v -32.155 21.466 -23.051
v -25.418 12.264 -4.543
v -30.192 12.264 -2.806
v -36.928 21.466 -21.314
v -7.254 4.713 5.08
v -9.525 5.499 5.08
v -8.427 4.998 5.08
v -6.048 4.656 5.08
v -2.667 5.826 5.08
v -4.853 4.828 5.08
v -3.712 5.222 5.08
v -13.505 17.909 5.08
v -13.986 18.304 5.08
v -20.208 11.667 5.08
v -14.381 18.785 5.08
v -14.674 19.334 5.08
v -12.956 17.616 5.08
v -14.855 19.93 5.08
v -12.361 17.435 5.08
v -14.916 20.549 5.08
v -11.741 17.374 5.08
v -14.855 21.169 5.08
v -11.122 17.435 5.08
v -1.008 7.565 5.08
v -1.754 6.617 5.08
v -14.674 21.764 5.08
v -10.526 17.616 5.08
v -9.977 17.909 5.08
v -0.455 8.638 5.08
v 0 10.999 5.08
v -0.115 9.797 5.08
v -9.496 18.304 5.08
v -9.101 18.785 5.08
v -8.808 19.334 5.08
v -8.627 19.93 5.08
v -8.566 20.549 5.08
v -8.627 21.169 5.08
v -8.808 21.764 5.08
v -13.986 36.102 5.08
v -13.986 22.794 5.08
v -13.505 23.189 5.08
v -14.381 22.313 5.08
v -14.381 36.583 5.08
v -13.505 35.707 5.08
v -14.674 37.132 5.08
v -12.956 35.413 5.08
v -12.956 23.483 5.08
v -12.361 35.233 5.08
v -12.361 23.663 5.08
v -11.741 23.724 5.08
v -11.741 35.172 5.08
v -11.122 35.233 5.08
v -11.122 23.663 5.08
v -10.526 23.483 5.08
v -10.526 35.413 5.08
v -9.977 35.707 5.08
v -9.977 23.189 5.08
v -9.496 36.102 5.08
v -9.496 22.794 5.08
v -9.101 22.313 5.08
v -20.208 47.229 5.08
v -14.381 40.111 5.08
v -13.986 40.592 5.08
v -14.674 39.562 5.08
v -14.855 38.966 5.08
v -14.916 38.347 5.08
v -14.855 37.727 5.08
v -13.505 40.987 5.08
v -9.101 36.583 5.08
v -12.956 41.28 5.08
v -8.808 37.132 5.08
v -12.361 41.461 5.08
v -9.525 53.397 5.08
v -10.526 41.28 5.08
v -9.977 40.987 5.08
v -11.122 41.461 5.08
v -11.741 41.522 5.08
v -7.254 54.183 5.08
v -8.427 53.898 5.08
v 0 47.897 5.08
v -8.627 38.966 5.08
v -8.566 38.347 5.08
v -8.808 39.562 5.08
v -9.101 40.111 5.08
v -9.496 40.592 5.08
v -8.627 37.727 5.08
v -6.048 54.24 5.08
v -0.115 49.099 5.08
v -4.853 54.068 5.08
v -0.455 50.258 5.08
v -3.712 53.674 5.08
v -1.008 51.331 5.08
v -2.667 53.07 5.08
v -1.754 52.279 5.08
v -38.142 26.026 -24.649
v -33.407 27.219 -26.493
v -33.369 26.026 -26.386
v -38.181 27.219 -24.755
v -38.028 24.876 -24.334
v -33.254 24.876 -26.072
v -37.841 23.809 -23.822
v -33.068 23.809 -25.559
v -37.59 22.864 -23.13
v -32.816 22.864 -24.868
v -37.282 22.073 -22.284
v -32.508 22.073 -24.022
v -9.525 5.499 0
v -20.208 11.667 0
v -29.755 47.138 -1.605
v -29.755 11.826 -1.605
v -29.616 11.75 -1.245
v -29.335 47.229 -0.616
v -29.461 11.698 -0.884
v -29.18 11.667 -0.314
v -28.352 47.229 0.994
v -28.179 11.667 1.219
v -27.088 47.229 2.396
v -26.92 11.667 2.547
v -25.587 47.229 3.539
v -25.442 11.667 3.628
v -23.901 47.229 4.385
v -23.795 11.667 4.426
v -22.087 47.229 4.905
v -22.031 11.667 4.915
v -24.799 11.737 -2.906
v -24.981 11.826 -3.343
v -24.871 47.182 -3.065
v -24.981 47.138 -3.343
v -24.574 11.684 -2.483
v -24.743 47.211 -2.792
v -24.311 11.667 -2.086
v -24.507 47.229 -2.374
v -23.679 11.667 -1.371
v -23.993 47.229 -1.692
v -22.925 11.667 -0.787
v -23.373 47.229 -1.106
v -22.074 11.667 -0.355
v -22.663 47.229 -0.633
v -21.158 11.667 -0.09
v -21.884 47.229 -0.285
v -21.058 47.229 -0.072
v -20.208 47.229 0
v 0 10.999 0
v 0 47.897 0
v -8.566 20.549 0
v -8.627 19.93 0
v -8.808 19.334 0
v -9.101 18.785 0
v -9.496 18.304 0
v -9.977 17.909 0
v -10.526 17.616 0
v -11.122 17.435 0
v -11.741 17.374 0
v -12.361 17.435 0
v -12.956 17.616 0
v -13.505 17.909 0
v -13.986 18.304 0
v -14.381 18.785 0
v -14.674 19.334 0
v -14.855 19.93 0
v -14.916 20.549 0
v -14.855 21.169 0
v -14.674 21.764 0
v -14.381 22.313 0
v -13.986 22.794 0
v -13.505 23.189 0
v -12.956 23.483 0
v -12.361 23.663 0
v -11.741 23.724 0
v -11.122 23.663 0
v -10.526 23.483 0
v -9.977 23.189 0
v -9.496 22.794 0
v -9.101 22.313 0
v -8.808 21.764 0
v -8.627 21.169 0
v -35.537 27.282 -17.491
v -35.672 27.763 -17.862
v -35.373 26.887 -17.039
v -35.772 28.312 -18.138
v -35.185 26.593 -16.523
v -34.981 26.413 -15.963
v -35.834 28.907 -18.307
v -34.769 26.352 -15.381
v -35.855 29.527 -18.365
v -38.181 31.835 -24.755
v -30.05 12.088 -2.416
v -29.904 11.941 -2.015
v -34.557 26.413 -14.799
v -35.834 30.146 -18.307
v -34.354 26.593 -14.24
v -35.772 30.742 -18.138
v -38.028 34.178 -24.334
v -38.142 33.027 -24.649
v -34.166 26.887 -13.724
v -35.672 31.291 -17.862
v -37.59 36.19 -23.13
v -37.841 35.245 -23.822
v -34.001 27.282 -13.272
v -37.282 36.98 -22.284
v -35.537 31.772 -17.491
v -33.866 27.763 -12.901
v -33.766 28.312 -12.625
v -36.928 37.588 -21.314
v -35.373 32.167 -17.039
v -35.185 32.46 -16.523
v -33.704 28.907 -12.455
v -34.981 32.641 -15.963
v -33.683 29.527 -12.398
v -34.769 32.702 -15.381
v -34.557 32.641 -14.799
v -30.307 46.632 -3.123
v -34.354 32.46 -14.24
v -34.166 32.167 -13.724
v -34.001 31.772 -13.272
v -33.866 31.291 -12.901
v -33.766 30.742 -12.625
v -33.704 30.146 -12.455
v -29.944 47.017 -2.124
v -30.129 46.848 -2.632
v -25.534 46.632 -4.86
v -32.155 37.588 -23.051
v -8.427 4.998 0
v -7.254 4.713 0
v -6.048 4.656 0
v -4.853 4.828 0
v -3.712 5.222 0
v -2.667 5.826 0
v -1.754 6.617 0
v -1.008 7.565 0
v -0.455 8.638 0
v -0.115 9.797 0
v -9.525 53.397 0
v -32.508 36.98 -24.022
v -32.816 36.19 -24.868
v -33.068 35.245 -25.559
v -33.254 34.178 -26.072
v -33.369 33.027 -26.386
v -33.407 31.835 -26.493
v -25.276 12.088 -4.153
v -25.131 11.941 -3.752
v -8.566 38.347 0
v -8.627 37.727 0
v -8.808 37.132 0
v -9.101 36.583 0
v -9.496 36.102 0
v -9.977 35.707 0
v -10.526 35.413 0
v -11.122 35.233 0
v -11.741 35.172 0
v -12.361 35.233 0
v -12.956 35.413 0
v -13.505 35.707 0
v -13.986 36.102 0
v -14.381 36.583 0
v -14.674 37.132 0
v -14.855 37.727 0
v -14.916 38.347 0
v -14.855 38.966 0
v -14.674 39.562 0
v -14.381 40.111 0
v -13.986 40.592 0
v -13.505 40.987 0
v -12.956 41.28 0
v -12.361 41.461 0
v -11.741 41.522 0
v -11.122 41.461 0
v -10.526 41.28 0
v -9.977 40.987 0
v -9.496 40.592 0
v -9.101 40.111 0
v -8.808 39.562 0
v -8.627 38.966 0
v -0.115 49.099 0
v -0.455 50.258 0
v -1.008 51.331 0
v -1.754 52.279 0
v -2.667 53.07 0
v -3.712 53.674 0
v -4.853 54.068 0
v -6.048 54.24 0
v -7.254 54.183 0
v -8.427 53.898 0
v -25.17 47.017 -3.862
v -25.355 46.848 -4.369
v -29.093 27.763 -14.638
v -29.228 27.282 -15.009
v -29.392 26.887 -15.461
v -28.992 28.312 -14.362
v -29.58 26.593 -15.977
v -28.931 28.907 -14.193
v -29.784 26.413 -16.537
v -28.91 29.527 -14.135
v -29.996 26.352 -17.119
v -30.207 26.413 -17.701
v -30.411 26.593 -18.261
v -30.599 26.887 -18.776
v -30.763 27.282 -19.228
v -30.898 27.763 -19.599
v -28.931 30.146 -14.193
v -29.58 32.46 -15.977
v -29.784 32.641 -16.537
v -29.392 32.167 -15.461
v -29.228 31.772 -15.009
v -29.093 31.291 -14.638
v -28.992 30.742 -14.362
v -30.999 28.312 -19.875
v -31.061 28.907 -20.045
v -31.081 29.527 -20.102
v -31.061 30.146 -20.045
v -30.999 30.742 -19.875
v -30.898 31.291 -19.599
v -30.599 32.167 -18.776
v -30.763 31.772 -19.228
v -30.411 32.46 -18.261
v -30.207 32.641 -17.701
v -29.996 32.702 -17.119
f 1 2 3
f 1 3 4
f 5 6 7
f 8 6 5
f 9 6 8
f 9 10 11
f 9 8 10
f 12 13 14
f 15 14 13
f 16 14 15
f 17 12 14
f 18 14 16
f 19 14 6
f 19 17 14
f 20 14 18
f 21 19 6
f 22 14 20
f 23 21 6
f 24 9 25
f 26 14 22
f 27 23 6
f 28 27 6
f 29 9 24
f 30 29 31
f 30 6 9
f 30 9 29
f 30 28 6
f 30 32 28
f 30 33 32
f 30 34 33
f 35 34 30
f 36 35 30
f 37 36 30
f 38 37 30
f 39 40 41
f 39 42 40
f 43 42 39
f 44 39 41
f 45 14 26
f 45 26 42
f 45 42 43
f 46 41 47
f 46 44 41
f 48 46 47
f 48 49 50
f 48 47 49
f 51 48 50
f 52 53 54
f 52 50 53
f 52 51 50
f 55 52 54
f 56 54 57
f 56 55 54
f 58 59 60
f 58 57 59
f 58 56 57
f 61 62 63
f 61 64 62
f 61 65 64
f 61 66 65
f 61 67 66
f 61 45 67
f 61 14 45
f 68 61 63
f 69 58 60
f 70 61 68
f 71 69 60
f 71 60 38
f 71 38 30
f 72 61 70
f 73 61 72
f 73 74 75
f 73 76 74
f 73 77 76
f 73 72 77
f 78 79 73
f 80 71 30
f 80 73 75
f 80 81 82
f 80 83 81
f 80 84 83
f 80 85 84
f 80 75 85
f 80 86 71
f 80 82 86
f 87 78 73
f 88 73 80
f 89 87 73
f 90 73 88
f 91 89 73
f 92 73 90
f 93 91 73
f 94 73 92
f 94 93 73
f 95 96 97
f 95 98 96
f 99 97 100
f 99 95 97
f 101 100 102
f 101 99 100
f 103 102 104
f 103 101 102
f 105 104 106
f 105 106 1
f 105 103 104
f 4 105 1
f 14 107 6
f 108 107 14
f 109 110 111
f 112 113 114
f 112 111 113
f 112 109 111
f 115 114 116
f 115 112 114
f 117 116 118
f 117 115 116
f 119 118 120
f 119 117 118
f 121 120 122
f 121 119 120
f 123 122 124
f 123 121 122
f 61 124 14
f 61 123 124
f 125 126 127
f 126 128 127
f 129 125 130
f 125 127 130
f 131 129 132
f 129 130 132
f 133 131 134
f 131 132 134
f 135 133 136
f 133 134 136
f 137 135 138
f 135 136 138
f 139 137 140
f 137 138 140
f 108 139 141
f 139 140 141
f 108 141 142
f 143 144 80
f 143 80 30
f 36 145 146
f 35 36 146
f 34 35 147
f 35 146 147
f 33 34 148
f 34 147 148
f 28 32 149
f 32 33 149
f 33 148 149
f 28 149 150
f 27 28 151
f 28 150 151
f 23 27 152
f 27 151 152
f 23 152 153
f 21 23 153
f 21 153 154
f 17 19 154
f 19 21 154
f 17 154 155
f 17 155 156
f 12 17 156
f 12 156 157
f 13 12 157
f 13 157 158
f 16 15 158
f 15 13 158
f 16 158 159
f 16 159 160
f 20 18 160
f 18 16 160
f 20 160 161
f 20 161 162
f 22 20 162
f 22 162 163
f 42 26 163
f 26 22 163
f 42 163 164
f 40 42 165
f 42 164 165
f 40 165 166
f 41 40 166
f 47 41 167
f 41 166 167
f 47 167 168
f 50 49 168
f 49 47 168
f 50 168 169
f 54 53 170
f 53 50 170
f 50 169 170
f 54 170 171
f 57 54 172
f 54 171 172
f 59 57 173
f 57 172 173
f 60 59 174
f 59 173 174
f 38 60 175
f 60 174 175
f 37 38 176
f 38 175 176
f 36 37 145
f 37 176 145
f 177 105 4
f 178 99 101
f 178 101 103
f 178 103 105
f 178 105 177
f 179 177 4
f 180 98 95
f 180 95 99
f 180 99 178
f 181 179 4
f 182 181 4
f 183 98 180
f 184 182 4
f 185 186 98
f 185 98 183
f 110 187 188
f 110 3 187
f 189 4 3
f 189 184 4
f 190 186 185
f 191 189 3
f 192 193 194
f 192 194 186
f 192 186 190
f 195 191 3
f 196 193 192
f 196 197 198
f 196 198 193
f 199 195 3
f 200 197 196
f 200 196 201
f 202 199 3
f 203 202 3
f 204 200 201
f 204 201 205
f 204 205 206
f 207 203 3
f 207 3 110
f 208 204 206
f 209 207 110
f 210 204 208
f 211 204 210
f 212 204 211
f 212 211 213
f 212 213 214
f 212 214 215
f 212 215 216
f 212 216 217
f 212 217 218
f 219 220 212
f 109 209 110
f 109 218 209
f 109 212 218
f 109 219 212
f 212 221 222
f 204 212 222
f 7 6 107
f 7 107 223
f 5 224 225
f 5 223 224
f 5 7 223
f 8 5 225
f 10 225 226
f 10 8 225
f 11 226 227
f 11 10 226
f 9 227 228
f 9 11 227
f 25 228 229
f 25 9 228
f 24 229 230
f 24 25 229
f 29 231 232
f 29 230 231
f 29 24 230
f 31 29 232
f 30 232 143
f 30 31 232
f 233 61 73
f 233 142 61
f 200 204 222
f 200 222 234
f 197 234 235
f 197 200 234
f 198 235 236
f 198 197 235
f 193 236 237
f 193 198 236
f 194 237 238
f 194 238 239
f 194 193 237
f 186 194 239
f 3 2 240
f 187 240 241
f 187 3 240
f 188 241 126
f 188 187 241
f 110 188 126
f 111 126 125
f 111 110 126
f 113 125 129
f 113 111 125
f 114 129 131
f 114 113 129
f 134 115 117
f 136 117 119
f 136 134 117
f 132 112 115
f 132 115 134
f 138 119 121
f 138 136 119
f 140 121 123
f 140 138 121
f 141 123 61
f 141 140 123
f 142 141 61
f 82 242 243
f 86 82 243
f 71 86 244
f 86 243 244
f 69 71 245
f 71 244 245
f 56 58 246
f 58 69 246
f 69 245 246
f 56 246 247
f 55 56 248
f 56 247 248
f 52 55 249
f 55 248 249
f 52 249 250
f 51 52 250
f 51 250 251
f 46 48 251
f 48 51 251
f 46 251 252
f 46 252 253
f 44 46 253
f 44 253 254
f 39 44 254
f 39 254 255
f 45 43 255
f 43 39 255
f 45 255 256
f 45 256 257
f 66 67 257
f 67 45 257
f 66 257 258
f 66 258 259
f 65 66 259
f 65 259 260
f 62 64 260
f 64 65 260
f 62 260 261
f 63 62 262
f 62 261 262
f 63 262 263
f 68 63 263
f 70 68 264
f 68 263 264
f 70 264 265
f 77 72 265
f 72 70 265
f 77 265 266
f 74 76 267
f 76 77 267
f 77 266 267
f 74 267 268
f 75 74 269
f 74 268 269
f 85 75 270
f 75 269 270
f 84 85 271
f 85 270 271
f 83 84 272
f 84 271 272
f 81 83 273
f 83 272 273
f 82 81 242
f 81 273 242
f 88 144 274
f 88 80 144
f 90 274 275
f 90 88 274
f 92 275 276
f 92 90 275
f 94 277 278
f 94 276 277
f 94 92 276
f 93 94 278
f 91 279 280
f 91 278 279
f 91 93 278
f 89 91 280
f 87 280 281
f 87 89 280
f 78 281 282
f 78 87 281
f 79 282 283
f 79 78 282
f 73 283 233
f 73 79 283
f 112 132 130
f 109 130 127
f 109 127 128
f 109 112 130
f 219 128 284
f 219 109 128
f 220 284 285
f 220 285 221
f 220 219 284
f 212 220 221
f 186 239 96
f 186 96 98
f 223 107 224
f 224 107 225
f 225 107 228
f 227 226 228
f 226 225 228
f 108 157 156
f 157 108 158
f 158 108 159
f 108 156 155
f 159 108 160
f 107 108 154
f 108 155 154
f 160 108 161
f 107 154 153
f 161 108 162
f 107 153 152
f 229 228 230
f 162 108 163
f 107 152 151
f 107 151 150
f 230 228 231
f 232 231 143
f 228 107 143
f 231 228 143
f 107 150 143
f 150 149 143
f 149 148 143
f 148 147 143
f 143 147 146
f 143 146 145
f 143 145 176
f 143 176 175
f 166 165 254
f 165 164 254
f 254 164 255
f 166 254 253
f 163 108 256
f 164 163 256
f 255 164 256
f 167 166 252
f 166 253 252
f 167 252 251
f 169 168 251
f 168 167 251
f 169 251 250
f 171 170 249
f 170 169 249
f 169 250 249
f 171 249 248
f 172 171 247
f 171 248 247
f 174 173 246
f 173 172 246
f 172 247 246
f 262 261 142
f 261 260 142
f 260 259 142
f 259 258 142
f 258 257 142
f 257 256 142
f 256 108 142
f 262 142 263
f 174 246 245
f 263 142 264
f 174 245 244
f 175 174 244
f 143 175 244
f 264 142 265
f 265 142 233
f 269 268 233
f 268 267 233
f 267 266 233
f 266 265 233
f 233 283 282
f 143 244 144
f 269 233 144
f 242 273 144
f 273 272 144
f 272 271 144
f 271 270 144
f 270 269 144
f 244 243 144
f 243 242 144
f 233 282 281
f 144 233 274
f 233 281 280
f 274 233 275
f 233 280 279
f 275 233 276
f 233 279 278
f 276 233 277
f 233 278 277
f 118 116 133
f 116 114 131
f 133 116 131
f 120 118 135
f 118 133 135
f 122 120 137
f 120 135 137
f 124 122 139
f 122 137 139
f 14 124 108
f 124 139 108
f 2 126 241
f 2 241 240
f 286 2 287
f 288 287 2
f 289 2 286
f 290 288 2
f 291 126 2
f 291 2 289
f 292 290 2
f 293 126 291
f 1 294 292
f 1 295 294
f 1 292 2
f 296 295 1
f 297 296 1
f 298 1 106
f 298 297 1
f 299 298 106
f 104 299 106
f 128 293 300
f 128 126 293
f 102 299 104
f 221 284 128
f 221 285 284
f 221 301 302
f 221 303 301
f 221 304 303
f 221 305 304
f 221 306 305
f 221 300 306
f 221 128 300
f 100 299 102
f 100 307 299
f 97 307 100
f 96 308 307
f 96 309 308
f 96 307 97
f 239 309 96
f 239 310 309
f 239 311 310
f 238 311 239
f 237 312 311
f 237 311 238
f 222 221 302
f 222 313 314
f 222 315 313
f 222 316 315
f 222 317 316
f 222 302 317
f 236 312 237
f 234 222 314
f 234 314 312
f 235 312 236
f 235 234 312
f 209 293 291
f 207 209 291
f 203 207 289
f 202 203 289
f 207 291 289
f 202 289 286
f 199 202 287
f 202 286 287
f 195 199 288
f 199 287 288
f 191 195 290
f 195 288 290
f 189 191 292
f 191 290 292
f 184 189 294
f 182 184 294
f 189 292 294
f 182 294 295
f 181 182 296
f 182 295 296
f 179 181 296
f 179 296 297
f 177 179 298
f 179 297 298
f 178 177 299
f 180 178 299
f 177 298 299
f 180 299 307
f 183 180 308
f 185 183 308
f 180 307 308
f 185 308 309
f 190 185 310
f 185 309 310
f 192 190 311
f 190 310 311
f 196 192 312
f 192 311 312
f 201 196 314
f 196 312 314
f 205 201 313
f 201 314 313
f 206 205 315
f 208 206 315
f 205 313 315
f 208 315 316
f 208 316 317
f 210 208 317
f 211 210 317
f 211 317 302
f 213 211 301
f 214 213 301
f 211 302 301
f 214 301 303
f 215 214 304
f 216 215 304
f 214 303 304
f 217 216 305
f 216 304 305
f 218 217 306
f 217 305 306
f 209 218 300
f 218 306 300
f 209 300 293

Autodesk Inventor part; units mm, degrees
ref_plane "YZ Plane" through (0, 0, 0) normal (1, 0, 0) x (0, 1, 0)
ref_plane "XZ Plane" through (0, 0, 0) normal (0, 1, 0) x (-1, 0, 0)
ref_plane "XY Plane" through (0, 0, 0) normal (0, 0, 1) x (1, 0, 0)
sketch "Base" plane through (0, 0, 0) normal (0, 0, 1) x (1, 0, 0)
  line L0 (-23.4822, 45.3385) -> (0, 58.896)
  line L1 (-23.4822, 13.5575) -> (-23.4822, 45.3385)
  line L2 (0, 0) -> (-23.4822, 13.5575)
  line L3 (0, 58.896) -> (0, 0)
  circle A0 centre (-11.7411, 38.3467) radius 3.175
  circle A1 centre (-11.7411, 20.5493) radius 3.175
  line L4 (-11.7411, 38.3467) -> (-11.7411, 20.5493) construction
  line L5 (-11.7411, 29.448) -> (-23.4822, 29.448) construction
  line L6 (-20.2078, 47.229) -> (-20.2078, 11.667)
  dimension "d0" = 58.896
  dimension "d1" = 27.1149
  dimension "d2" = 60
  dimension "d3" = 60
  dimension "d4" = 31.7811
  dimension "d5" = 6.35
  dimension "d6" = 17.7974
  dimension "d7" = 11.7411
  dimension "d8" = 11.7411
  dimension "d9" = 8.4667
extrude "Plate1" add sketch "Base" along normal blind 5.08 contours L0 L3 L2 L6
sketch "Sketch2" plane through (-24.9814, 47.229, -3.3425) normal (-0.9396926, 0, 0.3420201) x (0, -1, 0)
  line L0 (35.562, 0) -> (0, 0)
  line L1 (0, 0) -> (0, -24.6359)
  line L2 (0, -24.6359) -> (35.562, -24.6359)
  line L3 (35.562, -24.6359) -> (35.562, 0)
edge flange "ShockFlangeFeature" height 31.75 angle 70 thickness 5.08 bend radius 5.08 thickness toward (-0.9396926, 0, 0.3420201) relief tear relief width 5.08 relief depth 2.54 edges at (-20.2078, 29.448, 0) wall of the first edge with corners at (-24.9814, 11.667, -3.3425) (-24.9814, 47.229, -3.3425) (-33.4074, 47.229, -26.4927) (-33.4074, 11.667, -26.4927)
bend "Bend1"
corner "Corner1"
sketch "ShockFlangeDraft" plane through (-33.4074, 11.667, -26.4927) normal (0.9396926, 0, -0.3420201) x (-0.3420201, 0, -0.9396926)
  line L0 (-24.6359, 35.562) -> (-24.6359, 0) projected
  line L1 (0, 0) -> (-24.6359, 0) projected
  line L2 (0, 0) -> (0, 35.562) projected
  line L3 (0, 35.562) -> (-24.6359, 35.562) projected
  line L4 (-24.2986, 35.562) -> (0, 24.2098)
  line L5 (-24.6359, 0) -> (0, 11.5098)
  line L6 (0, 17.781) -> (-24.6359, 17.781) construction
  line L7 (-24.6359, 35.562) -> (-24.6359, 0) projected
  point P0 (-36.321, -11.667)
  dimension "d34" = 64.958
  dimension "d35" = 64.958
  dimension "d36" = 12.7
extrude "ShockFlangeDraftFeature" cut sketch "ShockFlangeDraft" against normal blind 25.4 contours L5 L2 L1 | L3 L2 L4
fillet "FilletsFeature" radius 6.35 6 edges at (-35.7942, 35.8768, -25.624) (0, 58.896, 2.54) (0, 0, 2.54) (-27.4836, 47.229, -2.7907) (-35.7942, 23.1768, -25.624) (-27.3682, 11.667, -2.4738)
sketch "ShockMountHole" plane through (-29.755, 11.667, -1.6051) normal (-0.9396926, 0, 0.3420201) x (0.3420201, 0, 0.9396926)
  circle A0 centre (-14.6604, 17.8598) radius 9.9755 construction
  line L0 (-24.6359, 15.5519) -> (-24.6359, 20.1677) projected
  line L1 (-20.9737, 25.9208) -> (-1.6149, 34.9651) projected
  line L2 (-1.2776, 0.5969) -> (-20.9737, 9.7989) projected
  circle A1 centre (-14.6604, 17.8598) radius 3.175
  point P0 (-0.1927, 28.9261)
  dimension "d37" = 6.35
hole "ShockMountHoleFeature" at (-34.7692, 29.5268, -15.3813) direction (0.9396926, 0, -0.3420201) diameter 6.35 end through all
equation "\"d35\" = d34"
equation "\"d32\" = Thickness"
equation "\"d10\" = Thickness"
equation "\"d11\" = BendReliefWidth"
equation "\"d12\" = BendReliefDepth"
equation "\"d13\" = MinimumRemnant"
equation "\"d14\" = TransitionRadius"
equation "\"d17\" = BendRadius"
equation "\"d18\" = CornerReliefSize"
equation "\"d19\" = GapSize"
equation "\"d20\" = JacobiRadiusSize"
equation "\"BendRadius\" = Thickness"
equation "\"BendReliefWidth\" = Thickness"
equation "\"BendReliefDepth\" = 0.5 * Thickness"
equation "\"CornerReliefSize\" = 4 * Thickness"
equation "\"MinimumRemnant\" = 2 * Thickness"
equation "\"TransitionRadius\" = BendRadius"
equation "\"JacobiRadiusSize\" = BendRadius"
equation "\"GapSize\" = Thickness"
equation "\"Thickness\" = 5.08"
properties part number "ChestPelvisConnector"
